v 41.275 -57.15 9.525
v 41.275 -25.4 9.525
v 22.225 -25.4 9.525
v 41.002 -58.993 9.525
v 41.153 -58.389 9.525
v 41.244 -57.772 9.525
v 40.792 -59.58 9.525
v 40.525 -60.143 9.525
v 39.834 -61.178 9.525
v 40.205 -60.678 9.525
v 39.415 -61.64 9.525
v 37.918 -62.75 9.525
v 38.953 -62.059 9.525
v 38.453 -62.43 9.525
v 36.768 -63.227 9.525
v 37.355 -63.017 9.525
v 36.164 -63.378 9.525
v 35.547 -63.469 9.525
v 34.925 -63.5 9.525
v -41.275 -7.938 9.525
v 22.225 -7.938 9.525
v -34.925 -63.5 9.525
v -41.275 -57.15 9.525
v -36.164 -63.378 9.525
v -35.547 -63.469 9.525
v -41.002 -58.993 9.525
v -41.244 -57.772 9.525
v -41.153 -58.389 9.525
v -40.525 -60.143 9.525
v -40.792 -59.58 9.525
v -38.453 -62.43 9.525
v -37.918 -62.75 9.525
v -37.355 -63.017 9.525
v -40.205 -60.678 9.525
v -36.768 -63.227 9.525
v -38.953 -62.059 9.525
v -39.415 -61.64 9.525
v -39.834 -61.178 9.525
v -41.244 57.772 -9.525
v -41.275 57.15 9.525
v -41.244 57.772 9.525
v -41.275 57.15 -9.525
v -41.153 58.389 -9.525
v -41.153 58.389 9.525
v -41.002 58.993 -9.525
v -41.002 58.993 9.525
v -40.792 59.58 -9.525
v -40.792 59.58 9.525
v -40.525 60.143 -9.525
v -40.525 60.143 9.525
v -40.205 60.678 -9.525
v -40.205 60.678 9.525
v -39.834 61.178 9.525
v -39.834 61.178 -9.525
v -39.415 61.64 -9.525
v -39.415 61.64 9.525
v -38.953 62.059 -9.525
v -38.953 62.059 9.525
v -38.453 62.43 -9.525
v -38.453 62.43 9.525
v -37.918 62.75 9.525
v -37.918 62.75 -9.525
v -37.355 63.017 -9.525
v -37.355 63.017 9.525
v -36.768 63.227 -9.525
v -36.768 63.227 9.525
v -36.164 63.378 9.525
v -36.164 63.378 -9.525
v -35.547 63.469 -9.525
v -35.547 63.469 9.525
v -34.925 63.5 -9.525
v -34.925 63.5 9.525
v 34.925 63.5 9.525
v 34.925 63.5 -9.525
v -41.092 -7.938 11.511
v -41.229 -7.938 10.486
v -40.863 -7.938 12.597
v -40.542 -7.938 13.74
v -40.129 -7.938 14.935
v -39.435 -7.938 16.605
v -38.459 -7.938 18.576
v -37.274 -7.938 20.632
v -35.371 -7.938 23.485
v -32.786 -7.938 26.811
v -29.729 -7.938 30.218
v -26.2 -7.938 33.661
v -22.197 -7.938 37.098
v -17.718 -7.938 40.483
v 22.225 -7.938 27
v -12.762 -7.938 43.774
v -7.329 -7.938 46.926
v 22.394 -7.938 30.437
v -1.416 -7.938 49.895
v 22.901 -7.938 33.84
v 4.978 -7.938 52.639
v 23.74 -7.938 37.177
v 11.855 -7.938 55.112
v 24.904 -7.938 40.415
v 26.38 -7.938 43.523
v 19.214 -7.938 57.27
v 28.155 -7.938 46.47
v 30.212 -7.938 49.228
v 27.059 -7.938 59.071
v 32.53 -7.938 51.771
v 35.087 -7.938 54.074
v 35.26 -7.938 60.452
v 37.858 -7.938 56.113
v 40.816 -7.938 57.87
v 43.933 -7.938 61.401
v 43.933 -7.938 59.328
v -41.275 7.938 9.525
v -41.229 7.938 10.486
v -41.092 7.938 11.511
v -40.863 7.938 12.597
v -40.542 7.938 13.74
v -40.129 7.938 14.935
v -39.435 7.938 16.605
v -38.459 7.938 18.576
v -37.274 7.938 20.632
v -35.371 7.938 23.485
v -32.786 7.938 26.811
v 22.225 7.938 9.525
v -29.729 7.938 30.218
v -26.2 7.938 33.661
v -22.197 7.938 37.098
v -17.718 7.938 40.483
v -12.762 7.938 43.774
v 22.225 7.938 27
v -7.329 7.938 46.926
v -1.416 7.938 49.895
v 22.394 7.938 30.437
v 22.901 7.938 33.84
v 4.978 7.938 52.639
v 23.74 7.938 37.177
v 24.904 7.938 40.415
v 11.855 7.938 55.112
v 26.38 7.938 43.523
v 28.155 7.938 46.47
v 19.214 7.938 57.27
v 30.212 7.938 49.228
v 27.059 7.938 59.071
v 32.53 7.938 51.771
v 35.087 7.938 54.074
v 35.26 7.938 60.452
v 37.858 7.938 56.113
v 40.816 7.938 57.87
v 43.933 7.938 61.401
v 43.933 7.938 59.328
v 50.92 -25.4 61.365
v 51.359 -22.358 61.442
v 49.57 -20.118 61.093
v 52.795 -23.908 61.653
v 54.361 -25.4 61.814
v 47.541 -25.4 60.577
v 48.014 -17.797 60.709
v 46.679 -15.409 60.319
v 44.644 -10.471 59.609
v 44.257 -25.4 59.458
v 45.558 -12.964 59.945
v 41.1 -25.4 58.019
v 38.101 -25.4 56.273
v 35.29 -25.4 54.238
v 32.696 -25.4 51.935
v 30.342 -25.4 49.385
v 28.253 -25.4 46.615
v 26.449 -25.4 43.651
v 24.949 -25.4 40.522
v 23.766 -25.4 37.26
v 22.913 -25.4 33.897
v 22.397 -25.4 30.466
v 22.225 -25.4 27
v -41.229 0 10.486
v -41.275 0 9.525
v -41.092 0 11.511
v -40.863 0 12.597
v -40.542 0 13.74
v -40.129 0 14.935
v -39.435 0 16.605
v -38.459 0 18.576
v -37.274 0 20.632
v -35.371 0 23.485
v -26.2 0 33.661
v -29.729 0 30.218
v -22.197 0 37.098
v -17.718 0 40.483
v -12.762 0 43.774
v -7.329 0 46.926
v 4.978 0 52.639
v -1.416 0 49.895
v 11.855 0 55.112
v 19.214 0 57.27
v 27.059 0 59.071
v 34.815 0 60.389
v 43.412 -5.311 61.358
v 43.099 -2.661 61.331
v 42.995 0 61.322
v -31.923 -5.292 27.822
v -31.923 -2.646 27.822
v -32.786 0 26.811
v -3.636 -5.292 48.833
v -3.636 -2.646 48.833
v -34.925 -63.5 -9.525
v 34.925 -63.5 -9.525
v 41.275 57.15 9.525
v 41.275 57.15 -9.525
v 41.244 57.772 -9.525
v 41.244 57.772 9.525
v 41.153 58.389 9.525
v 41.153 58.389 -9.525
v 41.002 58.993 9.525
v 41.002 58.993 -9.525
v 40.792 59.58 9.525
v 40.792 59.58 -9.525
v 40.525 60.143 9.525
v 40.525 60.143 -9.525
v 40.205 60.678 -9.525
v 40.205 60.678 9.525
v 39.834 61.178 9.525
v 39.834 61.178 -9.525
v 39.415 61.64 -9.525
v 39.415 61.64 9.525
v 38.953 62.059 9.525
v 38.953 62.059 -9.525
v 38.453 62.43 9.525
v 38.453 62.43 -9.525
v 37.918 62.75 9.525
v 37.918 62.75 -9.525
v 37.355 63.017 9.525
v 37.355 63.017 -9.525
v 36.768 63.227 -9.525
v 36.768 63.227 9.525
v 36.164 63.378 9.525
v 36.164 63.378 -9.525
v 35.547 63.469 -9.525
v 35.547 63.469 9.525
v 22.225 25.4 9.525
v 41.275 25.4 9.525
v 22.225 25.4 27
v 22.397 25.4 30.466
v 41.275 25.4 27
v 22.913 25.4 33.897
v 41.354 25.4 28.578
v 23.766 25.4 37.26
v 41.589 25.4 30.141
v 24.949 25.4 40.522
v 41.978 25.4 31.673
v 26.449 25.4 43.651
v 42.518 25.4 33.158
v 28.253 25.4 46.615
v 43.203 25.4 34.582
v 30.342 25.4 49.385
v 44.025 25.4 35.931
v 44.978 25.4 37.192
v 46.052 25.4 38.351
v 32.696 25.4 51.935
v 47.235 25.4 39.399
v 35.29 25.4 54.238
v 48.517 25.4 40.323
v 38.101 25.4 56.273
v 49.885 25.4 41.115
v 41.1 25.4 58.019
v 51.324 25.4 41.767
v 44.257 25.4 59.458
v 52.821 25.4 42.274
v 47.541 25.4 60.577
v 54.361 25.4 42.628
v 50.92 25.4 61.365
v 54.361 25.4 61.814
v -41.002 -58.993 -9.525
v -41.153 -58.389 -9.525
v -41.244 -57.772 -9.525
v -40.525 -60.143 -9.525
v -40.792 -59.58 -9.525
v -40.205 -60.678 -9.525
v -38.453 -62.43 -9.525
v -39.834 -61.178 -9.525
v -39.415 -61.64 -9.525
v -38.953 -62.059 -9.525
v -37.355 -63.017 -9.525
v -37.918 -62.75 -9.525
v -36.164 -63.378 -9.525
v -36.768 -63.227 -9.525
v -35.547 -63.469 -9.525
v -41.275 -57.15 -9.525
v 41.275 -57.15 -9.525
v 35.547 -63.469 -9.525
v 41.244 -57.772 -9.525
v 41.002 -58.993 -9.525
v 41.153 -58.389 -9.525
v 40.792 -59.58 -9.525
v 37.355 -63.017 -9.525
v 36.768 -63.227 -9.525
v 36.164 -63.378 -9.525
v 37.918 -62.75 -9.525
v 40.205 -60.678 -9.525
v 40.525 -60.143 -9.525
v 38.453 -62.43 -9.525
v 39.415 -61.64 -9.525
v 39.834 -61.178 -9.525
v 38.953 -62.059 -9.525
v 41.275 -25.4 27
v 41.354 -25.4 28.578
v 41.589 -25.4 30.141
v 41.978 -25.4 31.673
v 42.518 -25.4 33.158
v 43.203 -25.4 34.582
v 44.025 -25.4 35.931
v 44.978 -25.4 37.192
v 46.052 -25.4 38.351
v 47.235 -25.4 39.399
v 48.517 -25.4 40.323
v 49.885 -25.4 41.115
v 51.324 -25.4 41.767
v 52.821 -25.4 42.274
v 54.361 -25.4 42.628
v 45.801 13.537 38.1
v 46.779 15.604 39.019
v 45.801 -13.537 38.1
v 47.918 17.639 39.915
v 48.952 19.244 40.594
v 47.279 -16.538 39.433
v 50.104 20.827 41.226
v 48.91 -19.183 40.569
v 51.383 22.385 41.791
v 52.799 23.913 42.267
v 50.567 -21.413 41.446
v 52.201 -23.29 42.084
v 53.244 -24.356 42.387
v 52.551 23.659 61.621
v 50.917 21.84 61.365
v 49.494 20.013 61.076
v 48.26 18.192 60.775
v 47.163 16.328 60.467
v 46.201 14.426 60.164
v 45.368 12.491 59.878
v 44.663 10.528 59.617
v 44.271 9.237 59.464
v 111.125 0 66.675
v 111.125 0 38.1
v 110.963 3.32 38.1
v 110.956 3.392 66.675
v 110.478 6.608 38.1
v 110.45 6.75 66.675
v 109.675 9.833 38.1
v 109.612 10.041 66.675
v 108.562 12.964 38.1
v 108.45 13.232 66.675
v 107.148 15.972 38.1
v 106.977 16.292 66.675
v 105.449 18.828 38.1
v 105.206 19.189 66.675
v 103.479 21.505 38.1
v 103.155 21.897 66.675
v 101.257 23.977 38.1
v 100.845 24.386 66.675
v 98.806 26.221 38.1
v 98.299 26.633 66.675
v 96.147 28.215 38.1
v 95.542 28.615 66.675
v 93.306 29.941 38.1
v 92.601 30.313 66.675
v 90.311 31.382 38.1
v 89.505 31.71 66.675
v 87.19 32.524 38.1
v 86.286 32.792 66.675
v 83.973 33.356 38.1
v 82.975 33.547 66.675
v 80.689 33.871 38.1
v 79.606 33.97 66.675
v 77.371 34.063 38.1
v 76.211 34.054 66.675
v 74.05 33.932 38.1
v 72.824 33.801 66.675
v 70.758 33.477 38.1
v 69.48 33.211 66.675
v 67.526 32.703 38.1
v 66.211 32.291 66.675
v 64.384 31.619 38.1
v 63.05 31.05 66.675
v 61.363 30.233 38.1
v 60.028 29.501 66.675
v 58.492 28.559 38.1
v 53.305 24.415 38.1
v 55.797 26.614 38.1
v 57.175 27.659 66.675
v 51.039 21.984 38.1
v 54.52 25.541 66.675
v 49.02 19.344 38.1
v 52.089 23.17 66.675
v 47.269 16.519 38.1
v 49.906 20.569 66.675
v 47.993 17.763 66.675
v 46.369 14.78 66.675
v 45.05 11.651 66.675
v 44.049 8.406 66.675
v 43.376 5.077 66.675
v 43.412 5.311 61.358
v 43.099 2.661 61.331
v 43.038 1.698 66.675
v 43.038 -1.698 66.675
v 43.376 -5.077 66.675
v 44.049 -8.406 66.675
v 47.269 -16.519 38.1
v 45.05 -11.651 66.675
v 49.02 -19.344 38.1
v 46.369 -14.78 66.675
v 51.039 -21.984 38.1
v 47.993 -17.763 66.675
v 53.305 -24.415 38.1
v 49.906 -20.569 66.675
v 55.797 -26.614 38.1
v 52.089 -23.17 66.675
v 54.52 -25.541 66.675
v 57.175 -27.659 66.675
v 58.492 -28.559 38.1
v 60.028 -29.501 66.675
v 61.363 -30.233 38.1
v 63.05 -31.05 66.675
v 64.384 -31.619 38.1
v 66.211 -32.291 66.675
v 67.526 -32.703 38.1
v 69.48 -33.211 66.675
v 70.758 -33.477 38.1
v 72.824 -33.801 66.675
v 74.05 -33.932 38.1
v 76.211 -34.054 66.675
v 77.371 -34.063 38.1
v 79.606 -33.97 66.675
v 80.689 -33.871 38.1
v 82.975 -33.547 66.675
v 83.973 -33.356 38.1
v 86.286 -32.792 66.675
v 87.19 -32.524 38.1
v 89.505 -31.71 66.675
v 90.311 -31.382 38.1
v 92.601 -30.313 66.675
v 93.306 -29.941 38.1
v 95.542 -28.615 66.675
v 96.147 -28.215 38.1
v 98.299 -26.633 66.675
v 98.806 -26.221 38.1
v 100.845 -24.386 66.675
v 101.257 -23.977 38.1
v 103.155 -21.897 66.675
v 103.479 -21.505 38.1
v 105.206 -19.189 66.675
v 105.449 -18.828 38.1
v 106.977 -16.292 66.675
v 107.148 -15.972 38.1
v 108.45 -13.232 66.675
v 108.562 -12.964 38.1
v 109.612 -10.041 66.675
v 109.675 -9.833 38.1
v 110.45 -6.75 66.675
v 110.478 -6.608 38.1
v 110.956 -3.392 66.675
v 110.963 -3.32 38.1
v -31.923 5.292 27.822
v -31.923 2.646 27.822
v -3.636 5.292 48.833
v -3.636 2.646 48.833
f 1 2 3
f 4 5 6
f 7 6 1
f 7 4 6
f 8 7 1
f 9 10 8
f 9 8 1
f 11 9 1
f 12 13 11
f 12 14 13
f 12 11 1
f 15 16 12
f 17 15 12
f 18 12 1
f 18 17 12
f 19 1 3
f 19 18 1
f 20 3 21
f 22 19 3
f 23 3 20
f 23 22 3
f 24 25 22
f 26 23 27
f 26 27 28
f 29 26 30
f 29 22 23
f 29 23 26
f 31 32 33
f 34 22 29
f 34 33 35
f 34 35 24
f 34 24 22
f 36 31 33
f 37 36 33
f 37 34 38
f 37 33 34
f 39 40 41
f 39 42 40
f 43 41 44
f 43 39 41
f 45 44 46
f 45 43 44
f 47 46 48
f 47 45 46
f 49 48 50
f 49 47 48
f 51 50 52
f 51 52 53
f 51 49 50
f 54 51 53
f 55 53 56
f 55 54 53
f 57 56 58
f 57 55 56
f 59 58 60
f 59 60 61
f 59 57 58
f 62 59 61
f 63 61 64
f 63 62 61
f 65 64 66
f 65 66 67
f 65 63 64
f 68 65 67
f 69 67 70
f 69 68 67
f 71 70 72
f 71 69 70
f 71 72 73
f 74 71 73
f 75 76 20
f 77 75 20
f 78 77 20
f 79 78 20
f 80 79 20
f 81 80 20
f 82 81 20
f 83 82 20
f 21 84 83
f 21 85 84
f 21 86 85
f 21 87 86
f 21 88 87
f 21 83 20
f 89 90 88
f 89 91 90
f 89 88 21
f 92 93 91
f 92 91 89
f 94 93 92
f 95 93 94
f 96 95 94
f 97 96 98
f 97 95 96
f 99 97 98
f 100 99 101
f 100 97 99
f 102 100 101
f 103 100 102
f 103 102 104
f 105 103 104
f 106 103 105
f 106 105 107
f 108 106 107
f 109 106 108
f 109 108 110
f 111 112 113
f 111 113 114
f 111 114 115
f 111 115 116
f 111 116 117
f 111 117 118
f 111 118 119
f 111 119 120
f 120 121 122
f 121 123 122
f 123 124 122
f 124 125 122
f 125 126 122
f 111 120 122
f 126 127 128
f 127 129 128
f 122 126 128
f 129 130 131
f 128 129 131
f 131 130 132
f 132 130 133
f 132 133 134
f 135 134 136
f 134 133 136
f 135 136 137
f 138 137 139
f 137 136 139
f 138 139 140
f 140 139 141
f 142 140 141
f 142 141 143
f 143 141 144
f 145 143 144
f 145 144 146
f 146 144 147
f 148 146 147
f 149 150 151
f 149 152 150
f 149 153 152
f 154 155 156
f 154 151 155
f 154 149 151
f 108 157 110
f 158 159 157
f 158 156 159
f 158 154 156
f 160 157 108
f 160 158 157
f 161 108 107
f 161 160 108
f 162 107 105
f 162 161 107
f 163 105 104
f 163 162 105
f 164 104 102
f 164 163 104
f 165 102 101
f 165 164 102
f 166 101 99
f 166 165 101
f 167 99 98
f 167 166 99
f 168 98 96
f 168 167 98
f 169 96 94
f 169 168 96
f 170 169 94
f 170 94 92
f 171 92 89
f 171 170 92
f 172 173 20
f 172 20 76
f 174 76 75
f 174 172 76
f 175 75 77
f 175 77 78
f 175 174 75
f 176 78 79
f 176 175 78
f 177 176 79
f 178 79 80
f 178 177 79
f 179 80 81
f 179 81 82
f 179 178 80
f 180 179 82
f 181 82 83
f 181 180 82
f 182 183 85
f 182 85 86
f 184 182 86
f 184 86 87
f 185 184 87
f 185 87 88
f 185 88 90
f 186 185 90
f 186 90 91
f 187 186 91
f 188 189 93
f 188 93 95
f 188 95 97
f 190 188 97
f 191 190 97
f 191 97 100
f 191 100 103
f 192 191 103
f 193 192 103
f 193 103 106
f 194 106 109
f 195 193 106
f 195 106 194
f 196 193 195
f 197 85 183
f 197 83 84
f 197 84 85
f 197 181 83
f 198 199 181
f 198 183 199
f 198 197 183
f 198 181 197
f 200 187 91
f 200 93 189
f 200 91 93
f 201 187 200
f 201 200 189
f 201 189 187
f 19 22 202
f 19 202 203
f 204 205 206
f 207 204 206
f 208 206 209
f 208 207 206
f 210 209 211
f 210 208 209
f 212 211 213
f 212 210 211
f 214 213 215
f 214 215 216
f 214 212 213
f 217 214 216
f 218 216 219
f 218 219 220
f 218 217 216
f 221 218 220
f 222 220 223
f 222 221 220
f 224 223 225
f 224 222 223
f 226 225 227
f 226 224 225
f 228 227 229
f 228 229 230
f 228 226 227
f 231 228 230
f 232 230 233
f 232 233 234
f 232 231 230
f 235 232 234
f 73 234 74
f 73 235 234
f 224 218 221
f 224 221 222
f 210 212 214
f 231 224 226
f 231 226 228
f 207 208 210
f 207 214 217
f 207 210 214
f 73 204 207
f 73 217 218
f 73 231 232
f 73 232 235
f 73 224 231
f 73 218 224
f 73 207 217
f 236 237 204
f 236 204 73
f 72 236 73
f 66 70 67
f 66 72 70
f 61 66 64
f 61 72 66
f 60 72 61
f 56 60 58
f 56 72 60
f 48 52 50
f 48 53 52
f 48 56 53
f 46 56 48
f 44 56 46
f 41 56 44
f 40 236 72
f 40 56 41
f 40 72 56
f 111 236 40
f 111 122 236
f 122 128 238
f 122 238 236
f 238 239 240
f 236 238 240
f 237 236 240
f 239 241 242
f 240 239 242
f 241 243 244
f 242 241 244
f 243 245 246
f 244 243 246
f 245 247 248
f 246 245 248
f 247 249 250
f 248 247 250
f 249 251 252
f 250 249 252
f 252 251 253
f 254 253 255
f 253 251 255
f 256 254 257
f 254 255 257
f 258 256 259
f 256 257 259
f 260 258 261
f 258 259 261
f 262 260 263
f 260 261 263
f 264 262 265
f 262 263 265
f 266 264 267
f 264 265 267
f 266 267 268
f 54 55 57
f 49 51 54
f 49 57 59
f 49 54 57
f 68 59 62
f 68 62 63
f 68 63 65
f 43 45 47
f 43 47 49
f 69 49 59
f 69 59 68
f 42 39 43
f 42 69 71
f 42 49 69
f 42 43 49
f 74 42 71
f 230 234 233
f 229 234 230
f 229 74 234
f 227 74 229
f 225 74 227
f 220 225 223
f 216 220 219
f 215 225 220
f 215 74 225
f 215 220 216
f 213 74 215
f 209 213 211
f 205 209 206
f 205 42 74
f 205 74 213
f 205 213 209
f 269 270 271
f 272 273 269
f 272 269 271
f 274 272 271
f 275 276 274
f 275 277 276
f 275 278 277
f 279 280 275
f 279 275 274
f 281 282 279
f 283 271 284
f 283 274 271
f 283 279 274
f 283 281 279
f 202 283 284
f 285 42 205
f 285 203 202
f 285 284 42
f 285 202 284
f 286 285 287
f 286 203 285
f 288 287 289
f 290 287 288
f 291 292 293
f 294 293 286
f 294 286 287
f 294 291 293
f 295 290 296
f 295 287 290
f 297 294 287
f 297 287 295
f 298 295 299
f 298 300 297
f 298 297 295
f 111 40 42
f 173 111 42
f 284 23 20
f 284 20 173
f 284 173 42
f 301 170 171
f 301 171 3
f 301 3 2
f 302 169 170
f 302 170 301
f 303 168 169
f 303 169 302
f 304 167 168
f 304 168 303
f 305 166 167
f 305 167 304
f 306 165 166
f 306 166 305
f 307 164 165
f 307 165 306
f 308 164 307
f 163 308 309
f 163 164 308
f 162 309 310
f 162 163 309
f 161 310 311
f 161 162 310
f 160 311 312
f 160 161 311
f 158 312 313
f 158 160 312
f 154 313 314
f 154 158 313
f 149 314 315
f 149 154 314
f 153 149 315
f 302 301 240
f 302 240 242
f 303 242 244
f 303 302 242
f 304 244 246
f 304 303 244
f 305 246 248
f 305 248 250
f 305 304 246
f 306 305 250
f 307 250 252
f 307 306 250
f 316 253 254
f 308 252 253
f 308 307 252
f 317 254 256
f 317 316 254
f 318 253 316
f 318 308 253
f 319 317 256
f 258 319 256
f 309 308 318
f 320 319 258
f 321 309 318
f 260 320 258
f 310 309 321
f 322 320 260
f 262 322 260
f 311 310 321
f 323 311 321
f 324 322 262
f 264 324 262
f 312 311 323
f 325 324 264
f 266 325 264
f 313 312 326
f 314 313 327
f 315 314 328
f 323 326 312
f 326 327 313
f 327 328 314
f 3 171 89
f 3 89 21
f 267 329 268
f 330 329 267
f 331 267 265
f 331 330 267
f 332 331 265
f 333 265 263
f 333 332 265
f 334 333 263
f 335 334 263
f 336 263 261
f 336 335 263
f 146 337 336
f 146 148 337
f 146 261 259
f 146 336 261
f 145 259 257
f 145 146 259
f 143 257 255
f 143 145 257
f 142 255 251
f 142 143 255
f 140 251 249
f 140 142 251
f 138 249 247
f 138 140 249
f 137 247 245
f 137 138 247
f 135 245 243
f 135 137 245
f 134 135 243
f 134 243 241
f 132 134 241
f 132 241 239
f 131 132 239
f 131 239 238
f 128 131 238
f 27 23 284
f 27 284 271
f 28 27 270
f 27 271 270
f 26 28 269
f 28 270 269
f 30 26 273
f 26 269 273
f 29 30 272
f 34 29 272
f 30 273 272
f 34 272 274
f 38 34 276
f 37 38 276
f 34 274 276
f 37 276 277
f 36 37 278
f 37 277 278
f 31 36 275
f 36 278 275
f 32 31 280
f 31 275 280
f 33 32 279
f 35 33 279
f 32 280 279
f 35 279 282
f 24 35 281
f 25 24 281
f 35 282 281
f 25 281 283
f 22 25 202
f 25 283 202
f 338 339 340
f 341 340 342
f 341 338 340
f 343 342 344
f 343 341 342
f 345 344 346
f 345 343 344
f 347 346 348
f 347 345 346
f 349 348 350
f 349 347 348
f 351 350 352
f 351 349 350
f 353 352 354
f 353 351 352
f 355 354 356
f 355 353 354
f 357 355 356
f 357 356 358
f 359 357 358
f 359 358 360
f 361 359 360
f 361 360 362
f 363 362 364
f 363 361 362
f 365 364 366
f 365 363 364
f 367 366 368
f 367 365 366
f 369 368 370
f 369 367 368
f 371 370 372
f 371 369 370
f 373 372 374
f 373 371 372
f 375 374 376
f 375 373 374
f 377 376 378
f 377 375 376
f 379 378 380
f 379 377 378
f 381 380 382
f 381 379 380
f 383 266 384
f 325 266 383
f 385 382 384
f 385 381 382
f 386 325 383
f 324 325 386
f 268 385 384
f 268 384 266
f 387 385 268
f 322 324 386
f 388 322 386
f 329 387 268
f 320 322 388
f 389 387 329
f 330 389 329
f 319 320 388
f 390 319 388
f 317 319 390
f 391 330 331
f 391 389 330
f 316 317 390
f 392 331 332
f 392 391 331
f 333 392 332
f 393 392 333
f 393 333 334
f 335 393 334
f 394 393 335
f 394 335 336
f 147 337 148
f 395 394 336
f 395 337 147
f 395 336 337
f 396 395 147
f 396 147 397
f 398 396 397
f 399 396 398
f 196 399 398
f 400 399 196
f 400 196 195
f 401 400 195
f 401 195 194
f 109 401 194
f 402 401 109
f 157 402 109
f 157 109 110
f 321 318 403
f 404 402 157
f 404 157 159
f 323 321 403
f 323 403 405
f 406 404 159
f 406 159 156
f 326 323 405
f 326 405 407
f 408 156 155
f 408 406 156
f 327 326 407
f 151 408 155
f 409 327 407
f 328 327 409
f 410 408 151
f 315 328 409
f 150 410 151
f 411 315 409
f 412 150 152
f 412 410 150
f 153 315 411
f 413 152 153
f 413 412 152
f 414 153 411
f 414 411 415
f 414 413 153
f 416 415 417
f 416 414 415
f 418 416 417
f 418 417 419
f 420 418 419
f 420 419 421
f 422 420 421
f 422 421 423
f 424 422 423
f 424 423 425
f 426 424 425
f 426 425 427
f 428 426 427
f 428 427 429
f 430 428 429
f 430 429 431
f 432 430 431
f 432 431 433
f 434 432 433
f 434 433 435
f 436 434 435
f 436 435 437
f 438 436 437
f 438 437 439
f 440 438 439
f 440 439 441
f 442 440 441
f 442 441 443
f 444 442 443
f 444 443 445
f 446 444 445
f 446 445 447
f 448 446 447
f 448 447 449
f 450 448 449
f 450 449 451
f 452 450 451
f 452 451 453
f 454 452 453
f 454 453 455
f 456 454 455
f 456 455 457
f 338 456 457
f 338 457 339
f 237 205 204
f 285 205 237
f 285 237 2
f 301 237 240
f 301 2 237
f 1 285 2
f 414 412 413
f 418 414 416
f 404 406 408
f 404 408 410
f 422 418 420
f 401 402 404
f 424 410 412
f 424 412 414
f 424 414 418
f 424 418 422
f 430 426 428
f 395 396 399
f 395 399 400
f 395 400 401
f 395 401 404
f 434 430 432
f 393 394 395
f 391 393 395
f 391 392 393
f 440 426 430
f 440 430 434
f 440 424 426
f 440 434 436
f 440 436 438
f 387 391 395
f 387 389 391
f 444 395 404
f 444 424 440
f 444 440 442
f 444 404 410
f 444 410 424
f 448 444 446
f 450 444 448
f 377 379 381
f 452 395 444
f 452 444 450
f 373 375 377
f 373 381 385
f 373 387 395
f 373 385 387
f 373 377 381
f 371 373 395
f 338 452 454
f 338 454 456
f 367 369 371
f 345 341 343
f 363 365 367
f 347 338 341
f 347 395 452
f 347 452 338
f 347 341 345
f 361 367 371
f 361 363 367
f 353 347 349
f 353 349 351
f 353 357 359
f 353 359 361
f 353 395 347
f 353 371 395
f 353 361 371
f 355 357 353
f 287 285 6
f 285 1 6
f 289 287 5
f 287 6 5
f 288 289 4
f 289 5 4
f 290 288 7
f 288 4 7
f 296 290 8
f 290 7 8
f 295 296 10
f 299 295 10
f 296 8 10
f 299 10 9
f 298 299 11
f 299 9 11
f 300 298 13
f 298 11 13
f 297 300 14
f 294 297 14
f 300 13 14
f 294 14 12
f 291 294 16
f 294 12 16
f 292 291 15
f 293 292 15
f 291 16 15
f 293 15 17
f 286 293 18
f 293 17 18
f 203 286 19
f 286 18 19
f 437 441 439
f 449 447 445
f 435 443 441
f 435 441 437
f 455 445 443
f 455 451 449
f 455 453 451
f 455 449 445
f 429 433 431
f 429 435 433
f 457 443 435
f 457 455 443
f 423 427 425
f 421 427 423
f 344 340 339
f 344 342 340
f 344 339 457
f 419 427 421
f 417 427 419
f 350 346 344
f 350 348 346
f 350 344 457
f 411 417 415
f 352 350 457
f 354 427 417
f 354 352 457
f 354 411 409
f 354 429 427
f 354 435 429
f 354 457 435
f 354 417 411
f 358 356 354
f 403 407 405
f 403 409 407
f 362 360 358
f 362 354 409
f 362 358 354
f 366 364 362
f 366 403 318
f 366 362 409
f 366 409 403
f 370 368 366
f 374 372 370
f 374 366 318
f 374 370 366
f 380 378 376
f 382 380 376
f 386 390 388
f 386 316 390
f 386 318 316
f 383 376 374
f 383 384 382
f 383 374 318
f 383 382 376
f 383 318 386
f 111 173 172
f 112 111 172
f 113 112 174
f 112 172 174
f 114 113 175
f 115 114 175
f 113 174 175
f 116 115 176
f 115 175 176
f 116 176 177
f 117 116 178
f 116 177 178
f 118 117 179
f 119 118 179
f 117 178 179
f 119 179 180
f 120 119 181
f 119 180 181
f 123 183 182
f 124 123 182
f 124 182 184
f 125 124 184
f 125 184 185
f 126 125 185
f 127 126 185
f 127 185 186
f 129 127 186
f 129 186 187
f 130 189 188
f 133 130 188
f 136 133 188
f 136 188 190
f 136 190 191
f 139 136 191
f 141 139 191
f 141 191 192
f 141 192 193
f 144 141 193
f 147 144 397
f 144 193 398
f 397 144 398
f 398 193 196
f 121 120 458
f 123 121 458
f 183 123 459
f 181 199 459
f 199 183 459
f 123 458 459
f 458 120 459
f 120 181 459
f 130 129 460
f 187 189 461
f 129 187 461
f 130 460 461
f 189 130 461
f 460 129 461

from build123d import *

# Parameters (mm, degrees)
F1_DEPTH = 63.5
F0_W     = 16.735083
F0_H     = 4.7498
F2_DEPTH = 25.4
F3_DEPTH = 7.9375
F5_R     = 6.35


with BuildPart() as f1:
    # F0 (on Front) → F1 (new body, symmetric)
    with BuildSketch(Plane.XZ):
        Polygon((41.275, -9.525), (41.275, 9.525), (22.225, 9.525), (-41.275, 9.525), (-41.275, -9.525), align=None)
    extrude(amount=F1_DEPTH, both=True)

    # F0 (on Front) → F2 (join, symmetric)
    with BuildSketch(Plane.XZ):
        with Locations((68.692541, 64.3001)):
            Rectangle(F0_W, F0_H)
        with BuildLine():
            Line((22.225, 9.525), (41.275, 9.525))
            Line((41.275, 9.525), (41.275, 27.0002))
            ThreePointArc((41.275, 27.0002), (45.92468, 38.22552), (57.15, 42.8752))
            Line((57.15, 42.8752), (60.325, 42.8752))
            Line((60.325, 42.8752), (60.325, 61.9252))
            Line((60.325, 61.9252), (57.15, 61.9252))
            ThreePointArc((57.15, 61.9252), (32.454296, 51.695904), (22.225, 27.0002))
            Line((22.225, 27.0002), (22.225, 9.525))
        make_face()
    extrude(amount=F2_DEPTH, both=True)

    # F0 (on Front) → F3 (join, symmetric)
    with BuildSketch(Plane.XZ):
        with BuildLine():
            Line((-41.275, 9.525), (22.225, 9.525))
            Line((22.225, 9.525), (22.225, 27.0002))
            ThreePointArc((22.225, 27.0002), (32.454296, 51.695904), (57.15, 61.9252))
            add(Edge.make_bspline(
                [(-41.275, 9.525), (-41.275, 23.724295), (-9.110224, 61.9252), (57.15, 61.9252)],
                knots=[0, 0, 0, 0, 111.504536, 111.504536, 111.504536, 111.504536], degree=3))
        make_face()
    extrude(amount=F3_DEPTH, both=True)

    # F0 (on Front) → F4 (revolve)
    with BuildSketch(Plane.XZ):
        Polygon((77.060083, 61.9252), (77.060083, 42.8752), (77.060083, 38.1), (111.125, 38.1), (111.125, 66.675), (77.060083, 66.675), align=None)
    revolve(axis=Axis((77.060083, 0, 52.3875), (0, 0, 1)))

    # F5
    f5_edges = [f1.edges().sort_by_distance(p)[0] for p in [
        (41.275, -63.5, 0),
        (-41.275, -63.5, 0),
        (-41.275, 63.5, 0),
        (41.275, 63.5, 0),
    ]]
    fillet(f5_edges, radius=F5_R)


solid = f1.part
